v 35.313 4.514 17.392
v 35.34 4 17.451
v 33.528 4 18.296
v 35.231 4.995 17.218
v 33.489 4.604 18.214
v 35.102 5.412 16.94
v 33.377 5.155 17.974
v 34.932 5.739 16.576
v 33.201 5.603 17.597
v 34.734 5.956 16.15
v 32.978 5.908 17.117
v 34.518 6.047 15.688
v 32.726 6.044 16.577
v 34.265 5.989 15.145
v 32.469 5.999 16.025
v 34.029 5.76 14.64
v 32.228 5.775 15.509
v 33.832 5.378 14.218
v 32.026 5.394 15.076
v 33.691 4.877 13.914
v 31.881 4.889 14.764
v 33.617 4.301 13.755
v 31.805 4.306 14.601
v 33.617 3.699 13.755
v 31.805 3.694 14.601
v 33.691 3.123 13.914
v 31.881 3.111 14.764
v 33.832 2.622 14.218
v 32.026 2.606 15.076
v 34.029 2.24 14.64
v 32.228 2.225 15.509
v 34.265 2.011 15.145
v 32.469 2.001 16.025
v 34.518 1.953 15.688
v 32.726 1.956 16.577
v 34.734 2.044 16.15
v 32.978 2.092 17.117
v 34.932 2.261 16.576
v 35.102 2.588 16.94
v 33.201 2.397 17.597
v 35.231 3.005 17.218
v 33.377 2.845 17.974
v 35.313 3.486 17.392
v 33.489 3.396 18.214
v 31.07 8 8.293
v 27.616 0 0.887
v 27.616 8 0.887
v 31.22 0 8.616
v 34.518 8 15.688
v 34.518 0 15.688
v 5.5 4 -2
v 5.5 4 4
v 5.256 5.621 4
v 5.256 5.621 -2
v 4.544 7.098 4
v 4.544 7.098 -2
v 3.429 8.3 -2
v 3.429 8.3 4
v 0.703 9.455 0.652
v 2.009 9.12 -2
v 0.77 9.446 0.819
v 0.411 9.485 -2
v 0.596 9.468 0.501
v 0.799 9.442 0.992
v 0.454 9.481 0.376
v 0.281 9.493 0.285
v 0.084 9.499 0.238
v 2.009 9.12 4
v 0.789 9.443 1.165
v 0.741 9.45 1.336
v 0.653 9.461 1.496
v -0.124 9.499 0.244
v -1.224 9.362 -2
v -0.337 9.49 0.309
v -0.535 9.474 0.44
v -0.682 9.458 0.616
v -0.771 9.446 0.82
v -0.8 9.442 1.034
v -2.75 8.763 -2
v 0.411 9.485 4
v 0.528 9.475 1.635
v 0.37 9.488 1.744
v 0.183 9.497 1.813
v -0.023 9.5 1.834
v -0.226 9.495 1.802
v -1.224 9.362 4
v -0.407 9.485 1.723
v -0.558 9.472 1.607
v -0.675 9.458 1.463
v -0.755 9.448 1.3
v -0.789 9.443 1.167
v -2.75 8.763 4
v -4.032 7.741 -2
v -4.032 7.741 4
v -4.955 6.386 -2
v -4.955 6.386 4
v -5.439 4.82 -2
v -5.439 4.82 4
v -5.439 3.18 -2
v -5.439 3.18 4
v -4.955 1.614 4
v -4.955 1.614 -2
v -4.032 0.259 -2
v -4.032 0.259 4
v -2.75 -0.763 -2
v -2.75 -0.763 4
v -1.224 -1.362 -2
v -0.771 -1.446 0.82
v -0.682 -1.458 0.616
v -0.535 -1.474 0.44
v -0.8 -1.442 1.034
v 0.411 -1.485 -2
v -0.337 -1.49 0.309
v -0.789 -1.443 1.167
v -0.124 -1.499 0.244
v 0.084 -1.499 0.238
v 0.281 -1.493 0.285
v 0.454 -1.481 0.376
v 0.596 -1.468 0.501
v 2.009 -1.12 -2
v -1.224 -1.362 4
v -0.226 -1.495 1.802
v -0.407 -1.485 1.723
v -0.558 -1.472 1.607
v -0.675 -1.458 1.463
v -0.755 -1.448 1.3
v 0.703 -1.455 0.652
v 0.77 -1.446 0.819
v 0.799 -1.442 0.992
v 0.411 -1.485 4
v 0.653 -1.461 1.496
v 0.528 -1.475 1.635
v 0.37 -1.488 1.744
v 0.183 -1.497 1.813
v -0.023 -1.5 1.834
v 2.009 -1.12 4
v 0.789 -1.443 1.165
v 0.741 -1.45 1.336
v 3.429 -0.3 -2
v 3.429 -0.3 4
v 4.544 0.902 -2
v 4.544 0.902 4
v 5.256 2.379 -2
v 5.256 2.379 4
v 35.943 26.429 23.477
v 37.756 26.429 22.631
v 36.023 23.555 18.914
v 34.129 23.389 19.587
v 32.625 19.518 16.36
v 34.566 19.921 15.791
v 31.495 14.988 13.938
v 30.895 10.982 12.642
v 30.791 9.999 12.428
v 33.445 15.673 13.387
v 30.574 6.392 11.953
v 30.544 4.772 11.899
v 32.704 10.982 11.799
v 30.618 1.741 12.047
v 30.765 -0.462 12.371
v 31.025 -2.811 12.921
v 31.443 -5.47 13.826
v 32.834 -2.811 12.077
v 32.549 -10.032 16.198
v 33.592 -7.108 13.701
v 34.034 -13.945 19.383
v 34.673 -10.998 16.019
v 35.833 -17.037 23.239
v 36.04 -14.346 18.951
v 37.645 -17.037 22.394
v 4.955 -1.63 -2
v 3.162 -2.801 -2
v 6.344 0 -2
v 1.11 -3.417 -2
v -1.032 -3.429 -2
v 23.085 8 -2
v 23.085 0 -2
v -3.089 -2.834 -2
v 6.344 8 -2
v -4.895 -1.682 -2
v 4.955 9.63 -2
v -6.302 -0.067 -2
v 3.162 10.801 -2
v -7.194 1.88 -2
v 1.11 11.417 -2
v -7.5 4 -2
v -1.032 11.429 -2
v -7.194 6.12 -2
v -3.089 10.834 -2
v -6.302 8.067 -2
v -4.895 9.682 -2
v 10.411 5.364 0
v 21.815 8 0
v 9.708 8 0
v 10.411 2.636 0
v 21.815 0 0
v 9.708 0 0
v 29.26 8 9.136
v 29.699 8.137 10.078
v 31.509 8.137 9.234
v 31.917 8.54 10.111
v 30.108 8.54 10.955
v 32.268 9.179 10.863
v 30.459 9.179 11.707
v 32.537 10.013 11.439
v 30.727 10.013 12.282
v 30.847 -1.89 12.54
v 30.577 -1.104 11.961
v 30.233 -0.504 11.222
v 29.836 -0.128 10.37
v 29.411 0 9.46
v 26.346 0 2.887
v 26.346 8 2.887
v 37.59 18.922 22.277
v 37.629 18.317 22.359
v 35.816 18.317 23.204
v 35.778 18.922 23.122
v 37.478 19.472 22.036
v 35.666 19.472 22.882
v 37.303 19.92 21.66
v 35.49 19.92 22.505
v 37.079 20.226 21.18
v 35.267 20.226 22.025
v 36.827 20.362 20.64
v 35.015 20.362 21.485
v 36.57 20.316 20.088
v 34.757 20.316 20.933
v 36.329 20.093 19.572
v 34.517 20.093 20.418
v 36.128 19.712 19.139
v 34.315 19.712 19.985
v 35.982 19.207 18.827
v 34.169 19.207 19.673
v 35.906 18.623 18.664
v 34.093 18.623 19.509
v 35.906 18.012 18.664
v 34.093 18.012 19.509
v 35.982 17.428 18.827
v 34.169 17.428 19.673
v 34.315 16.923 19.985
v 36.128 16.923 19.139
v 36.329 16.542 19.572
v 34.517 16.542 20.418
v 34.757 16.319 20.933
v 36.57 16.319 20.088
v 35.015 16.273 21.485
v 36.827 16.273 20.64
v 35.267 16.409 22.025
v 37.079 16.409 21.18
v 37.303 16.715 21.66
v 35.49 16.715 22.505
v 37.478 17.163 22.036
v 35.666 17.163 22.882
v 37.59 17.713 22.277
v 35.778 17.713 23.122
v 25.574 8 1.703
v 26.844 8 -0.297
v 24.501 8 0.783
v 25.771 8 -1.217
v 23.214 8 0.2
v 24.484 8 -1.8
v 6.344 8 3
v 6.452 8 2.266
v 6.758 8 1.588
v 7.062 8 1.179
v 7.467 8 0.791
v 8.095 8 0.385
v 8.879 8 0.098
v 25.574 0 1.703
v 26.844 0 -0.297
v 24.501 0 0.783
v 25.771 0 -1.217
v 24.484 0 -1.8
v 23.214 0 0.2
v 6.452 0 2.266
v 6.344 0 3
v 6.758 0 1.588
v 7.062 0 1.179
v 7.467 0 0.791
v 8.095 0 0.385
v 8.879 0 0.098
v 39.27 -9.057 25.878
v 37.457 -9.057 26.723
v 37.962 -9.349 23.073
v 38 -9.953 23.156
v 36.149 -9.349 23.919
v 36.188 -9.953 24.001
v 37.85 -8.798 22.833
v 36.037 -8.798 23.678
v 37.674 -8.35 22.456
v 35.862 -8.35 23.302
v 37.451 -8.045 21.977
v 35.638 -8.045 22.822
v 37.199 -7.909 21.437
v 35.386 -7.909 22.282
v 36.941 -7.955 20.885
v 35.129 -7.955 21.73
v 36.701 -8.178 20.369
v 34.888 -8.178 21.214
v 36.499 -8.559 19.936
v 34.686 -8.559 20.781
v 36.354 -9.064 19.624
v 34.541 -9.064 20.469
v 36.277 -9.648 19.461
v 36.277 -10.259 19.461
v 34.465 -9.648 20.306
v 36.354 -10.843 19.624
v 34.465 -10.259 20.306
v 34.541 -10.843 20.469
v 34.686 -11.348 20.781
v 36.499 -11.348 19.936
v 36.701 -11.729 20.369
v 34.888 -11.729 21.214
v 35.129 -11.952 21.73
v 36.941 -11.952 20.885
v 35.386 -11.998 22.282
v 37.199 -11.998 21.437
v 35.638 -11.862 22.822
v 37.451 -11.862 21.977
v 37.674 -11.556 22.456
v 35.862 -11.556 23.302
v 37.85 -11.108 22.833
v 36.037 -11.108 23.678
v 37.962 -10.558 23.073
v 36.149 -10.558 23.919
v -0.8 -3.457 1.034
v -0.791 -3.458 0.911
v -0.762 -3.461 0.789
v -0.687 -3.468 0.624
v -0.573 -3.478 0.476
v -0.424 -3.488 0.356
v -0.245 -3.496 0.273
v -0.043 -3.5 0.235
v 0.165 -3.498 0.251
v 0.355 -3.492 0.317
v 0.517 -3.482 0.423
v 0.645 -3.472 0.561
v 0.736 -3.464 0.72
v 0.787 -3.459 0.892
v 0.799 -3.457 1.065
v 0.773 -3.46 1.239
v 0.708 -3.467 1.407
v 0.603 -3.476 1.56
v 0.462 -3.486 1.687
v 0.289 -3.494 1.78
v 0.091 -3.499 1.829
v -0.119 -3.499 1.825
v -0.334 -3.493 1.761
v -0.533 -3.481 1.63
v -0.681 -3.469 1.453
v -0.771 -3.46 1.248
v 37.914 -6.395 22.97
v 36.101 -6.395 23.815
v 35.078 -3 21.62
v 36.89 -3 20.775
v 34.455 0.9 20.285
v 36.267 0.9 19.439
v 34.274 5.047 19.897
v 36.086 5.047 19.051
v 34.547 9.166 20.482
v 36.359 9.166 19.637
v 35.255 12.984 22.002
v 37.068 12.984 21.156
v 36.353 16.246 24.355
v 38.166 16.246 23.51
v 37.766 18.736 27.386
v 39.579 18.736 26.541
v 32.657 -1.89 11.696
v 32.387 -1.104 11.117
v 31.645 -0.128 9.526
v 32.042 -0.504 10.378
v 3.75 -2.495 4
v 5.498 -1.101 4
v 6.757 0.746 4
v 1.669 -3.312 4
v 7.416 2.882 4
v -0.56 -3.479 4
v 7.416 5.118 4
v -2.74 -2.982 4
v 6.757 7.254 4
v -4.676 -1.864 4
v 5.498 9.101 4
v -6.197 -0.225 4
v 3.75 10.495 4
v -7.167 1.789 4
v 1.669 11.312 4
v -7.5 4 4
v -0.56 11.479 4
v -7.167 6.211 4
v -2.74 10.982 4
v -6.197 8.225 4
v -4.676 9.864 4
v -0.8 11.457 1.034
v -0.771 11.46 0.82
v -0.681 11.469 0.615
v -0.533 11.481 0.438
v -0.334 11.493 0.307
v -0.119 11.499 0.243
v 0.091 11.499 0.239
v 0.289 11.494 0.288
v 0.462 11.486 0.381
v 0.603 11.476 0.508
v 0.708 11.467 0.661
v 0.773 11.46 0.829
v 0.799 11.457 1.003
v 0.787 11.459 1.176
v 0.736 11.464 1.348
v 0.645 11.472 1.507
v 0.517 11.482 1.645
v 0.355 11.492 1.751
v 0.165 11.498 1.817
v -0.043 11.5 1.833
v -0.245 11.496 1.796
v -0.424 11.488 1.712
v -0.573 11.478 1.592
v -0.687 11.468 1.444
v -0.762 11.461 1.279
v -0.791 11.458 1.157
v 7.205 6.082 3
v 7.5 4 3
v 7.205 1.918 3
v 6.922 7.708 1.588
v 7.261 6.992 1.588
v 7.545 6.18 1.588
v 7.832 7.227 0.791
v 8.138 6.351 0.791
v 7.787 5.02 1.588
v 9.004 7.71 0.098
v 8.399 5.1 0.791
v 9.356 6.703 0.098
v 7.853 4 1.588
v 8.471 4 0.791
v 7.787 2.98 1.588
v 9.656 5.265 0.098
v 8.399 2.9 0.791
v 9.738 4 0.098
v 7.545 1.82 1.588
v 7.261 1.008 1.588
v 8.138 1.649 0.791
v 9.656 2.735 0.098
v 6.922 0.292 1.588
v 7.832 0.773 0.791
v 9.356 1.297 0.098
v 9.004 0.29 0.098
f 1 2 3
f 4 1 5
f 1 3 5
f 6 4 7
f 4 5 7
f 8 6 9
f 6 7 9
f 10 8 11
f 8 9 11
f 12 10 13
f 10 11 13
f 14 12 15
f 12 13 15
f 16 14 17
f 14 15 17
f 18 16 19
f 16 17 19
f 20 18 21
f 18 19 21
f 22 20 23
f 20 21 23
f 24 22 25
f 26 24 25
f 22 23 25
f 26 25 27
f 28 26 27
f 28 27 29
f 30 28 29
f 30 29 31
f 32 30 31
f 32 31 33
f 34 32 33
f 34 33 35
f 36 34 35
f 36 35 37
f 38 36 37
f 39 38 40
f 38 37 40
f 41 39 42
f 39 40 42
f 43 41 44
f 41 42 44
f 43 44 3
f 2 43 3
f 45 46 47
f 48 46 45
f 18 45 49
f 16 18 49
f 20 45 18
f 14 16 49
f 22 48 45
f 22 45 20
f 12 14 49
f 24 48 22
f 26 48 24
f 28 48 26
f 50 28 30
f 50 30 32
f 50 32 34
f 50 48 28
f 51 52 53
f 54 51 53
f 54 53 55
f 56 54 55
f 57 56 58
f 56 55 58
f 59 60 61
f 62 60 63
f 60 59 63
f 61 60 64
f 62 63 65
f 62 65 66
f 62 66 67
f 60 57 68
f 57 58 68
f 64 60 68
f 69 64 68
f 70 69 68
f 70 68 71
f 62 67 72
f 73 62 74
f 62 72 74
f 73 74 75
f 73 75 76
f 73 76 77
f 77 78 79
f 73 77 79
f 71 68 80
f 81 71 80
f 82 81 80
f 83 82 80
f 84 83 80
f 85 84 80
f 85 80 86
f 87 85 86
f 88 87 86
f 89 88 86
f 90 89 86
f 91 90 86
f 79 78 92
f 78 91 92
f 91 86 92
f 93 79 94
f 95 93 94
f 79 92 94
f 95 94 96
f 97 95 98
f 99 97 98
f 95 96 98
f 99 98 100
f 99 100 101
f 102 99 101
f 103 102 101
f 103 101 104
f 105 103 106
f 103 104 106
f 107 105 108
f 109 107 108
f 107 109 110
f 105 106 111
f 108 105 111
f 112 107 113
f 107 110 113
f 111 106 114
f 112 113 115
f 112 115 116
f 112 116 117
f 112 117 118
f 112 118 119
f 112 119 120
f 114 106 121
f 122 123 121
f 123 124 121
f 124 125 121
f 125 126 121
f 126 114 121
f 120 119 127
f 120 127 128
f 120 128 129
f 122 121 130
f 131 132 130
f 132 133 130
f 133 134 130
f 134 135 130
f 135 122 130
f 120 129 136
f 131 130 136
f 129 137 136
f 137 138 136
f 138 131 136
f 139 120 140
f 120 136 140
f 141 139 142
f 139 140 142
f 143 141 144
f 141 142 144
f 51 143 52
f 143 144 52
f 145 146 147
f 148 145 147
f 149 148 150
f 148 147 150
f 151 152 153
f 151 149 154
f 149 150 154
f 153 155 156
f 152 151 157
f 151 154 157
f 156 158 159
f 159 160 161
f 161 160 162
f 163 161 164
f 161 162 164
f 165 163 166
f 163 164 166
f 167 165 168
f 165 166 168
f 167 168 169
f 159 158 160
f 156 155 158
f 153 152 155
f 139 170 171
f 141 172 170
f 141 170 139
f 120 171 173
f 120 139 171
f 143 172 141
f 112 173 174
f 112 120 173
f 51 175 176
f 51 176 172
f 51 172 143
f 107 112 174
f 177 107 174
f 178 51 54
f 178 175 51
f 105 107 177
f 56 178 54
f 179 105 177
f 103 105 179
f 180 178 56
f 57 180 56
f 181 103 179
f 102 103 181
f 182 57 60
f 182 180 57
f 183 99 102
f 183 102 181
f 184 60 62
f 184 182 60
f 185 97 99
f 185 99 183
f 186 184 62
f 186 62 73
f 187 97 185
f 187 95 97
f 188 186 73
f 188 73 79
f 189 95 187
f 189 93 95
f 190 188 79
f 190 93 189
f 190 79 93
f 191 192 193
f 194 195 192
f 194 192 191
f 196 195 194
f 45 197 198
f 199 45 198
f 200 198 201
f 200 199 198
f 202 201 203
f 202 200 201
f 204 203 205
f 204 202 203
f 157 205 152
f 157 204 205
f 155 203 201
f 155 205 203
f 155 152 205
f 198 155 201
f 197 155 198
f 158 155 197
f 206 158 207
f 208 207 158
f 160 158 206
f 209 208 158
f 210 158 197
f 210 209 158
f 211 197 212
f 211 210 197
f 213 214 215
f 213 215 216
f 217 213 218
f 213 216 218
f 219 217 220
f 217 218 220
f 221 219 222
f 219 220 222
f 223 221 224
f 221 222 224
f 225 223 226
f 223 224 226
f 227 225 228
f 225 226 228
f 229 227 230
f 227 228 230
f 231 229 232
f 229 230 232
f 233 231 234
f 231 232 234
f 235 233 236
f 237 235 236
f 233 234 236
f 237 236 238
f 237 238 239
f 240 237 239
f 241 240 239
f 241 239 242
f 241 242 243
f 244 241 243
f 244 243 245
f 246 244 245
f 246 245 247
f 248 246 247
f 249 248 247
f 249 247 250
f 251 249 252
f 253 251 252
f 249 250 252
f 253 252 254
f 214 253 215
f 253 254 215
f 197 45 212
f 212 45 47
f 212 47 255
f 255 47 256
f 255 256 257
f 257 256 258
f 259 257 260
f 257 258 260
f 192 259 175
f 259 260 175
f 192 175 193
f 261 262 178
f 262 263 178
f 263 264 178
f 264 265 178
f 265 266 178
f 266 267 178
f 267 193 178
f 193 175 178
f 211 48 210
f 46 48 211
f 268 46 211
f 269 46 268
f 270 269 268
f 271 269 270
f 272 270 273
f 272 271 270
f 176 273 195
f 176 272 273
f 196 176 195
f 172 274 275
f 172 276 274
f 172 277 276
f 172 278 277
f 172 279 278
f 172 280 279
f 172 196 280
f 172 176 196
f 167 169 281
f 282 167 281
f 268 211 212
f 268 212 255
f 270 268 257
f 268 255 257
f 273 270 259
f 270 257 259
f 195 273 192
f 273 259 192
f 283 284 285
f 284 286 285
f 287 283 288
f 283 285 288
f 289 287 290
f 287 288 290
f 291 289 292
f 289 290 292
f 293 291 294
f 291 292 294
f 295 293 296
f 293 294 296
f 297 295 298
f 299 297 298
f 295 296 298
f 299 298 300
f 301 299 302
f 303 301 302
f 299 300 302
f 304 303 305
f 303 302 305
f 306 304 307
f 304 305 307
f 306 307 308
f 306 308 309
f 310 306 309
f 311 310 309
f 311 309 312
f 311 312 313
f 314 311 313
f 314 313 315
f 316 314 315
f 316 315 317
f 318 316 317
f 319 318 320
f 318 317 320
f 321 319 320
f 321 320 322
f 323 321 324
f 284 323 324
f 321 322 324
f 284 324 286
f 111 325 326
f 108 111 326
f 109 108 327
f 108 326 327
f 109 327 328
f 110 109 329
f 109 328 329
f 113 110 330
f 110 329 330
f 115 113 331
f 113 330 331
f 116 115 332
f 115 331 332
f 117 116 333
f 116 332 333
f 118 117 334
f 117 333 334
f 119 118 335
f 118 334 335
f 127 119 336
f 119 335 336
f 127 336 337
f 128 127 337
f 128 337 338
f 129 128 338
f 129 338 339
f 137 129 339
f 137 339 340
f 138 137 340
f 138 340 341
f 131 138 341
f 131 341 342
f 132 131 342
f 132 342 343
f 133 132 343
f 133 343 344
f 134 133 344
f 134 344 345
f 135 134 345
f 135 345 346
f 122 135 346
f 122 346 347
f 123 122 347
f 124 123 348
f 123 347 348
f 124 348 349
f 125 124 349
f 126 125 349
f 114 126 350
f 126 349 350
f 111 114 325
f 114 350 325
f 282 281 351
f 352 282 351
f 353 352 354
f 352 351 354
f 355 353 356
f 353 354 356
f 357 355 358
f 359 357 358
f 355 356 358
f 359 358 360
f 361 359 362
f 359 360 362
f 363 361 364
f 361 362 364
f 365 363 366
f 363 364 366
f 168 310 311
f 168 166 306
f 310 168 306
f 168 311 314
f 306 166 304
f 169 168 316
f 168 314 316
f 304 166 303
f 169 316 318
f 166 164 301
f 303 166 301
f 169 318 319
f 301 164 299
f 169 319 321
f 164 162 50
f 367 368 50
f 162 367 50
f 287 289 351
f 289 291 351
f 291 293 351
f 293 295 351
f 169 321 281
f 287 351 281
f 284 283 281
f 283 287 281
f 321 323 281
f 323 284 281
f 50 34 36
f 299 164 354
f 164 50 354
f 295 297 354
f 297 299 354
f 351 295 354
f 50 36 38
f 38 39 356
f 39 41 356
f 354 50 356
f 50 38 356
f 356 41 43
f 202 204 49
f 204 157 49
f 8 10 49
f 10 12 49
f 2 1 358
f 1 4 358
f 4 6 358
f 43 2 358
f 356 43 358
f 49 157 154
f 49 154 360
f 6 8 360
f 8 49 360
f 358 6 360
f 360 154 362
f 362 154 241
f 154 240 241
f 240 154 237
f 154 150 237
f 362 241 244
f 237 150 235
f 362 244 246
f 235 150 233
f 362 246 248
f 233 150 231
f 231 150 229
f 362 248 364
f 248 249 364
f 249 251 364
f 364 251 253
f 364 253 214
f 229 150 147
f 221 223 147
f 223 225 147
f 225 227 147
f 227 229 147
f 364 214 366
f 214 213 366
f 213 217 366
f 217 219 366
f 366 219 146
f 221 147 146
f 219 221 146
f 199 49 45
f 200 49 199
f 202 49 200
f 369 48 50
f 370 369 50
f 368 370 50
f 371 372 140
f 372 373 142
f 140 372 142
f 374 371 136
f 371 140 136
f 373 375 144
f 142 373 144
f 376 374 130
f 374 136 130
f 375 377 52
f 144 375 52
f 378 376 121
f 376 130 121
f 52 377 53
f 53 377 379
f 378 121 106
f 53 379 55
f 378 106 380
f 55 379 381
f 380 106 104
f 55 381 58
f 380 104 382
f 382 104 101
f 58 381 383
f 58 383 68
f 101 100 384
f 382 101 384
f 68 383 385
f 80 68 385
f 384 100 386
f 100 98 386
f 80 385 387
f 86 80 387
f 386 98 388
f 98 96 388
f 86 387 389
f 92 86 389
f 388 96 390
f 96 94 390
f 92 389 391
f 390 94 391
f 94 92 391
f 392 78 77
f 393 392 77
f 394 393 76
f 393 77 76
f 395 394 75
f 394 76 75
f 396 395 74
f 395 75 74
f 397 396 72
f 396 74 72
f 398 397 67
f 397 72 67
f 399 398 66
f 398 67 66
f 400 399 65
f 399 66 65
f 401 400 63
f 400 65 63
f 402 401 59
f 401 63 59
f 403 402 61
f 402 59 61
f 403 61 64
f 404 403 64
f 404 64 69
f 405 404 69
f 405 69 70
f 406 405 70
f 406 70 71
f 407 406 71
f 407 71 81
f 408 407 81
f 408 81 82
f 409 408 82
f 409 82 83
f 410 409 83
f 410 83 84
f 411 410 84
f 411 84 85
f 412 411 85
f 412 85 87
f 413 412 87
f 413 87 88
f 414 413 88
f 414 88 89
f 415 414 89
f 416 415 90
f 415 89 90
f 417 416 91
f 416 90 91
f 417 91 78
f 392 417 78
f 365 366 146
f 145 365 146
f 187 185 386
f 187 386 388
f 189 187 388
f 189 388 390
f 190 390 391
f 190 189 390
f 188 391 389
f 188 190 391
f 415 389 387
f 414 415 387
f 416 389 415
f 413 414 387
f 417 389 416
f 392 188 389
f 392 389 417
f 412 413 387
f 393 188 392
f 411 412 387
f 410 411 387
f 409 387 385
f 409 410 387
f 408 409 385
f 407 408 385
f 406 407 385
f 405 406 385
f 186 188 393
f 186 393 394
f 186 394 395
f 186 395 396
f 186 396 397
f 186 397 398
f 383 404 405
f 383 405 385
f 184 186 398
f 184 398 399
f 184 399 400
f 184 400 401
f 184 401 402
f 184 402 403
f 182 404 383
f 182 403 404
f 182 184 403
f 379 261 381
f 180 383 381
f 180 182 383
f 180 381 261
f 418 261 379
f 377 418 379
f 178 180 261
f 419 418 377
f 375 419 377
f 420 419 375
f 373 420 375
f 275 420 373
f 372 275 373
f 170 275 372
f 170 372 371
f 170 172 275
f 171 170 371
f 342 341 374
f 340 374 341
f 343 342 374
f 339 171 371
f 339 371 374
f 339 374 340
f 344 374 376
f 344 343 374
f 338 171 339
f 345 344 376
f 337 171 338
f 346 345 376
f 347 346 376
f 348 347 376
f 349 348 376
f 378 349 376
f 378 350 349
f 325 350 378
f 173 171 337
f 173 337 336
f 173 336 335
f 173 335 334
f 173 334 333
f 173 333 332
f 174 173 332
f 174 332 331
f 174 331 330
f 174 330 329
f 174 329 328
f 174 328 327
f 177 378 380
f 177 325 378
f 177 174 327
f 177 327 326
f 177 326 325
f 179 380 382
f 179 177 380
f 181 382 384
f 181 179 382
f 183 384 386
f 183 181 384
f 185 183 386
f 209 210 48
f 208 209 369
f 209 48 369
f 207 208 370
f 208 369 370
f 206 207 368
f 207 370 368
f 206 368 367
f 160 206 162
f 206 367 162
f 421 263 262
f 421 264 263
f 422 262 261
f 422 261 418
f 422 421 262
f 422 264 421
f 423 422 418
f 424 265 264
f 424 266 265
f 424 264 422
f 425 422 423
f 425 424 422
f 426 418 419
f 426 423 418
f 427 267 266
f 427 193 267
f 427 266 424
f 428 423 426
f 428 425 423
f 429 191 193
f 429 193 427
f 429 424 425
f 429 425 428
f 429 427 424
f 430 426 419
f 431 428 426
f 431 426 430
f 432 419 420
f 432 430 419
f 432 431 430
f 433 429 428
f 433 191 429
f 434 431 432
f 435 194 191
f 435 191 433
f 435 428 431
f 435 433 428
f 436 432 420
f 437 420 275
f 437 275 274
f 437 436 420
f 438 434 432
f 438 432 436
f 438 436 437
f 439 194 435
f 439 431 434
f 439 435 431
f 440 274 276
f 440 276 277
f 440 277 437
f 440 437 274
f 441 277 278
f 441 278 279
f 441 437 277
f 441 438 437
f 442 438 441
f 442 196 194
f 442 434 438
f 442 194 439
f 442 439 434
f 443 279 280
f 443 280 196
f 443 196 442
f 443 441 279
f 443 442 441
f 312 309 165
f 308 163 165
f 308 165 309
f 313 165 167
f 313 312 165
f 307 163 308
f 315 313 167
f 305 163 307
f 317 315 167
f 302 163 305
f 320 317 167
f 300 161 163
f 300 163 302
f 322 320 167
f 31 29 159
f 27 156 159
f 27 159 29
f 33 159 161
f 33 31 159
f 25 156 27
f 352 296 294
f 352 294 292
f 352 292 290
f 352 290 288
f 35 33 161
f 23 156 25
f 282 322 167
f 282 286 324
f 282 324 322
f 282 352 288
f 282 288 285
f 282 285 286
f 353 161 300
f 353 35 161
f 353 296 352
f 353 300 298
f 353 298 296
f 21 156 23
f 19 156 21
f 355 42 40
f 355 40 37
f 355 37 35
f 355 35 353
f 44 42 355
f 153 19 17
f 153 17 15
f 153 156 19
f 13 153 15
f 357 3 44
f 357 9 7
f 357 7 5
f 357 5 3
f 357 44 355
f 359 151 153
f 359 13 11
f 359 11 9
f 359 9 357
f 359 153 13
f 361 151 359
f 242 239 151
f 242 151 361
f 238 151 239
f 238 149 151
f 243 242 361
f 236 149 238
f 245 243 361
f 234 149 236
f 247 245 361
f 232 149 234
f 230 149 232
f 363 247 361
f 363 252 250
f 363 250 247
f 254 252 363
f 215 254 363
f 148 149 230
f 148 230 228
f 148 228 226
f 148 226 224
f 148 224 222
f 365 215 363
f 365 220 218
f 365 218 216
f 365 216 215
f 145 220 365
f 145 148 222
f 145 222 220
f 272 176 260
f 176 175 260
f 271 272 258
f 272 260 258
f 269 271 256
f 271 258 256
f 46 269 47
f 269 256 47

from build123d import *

# Parameters (mm, degrees)
BOSS_EXTRUDE1_DEPTH     = 8
FILLET1_R               = 5
BOSS_EXTRUDE2_DEPTH     = 2
SKETCH3_R               = 2.05
CUT_EXTRUDE3_DEPTH      = 10
CUT_EXTRUDE3_DEPTH_BACK = 10
FILLET2_R               = 4
SKETCH6_R               = 7.5
BOSS_EXTRUDE3_DEPTH     = 6
SKETCH2_R               = 5.5
CUT_EXTRUDE4_DEPTH      = 28.386006481
CUT_EXTRUDE4_DEPTH_BACK = 3
SKETCH8_R               = 0.8
CUT_EXTRUDE5_DEPTH      = 30.928860828
FILLET3_R               = 3


with BuildPart() as part:
    # Sketch1 → Boss-Extrude1 (new body)
    with BuildSketch(Plane(origin=(0, 0, 0), x_dir=(1, 0, 0), z_dir=(0, 1, 0))):
        Polygon((0, 0), (0, 2), (26.270067987, 2), (34.518104392, -15.687971152), (32.760161227, -16.641719455), (25, 0), align=None)
    extrude(amount=BOSS_EXTRUDE1_DEPTH)

    # Fillet1
    fillet1_edges = [part.edges().sort_by_distance(p)[0] for p in [
        (26.270067987, 4, -2),
        (25, 4, 0),
    ]]
    fillet(fillet1_edges, radius=FILLET1_R)

    # Sketch5 → Boss-Extrude2 (add)
    with BuildSketch(Plane(origin=(22.344115541, 0, -10.419232191), x_dir=(-0.422618262, 0, -0.906307787), z_dir=(0.906307787, 0, -0.422618262))):
        with BuildLine():
            Line((-40.780850255, 18.736062391), (-36.467218683, 26.428860828))
            ThreePointArc((-36.467218683, 26.428860828), (-23.692308478, 4.771999965), (-36.205658542, -17.037035395))
            Line((-36.205658542, -17.037035395), (-40.049339329, -9.057253488))
            ThreePointArc((-40.049339329, -9.057253488), (-32.517126315, 5.047276383), (-40.780850255, 18.736062391))
        make_face()
    extrude(amount=-BOSS_EXTRUDE2_DEPTH)

    # Sketch3 → Cut-Extrude3 (cut, two sides)
    with BuildSketch(Plane(origin=(20.534845121, 0, -9.575555539), x_dir=(0.422618262, 0, 0.906307787), z_dir=(-0.906307787, 0, 0.422618262))) as cut_extrude3_sk:
        with Locations((28.701516689, 4)):
            Circle(SKETCH3_R)
        with Locations((34.117040182, 18.317355913)):
            Circle(SKETCH3_R)
        with Locations((48.070293023, 24.611901983)):
            Circle(SKETCH3_R)
        with Locations((62.387648936, 19.19637849)):
            Circle(SKETCH3_R)
        with Locations((68.682195005, 5.243125649)):
            Circle(SKETCH3_R)
        with Locations((63.266671512, -9.074230264)):
            Circle(SKETCH3_R)
        with Locations((49.313418672, -15.368776333)):
            Circle(SKETCH3_R)
        with Locations((34.996062759, -9.953252841)):
            Circle(SKETCH3_R)
    extrude(amount=CUT_EXTRUDE3_DEPTH, mode=Mode.SUBTRACT)
    extrude(cut_extrude3_sk.sketch, amount=-CUT_EXTRUDE3_DEPTH_BACK, mode=Mode.SUBTRACT)

    # Fillet2
    fillet2_edges = [part.edges().sort_by_distance(p)[0] for p in [
        (31.634193328, 0, 11.865238709),
        (31.549009715, 8, 11.682561863),
    ]]
    fillet(fillet2_edges, radius=FILLET2_R)

    # Sketch6 → Boss-Extrude3 (add)
    with BuildSketch(Plane(origin=(0, 0, -2), x_dir=(-1, 0, 0), z_dir=(0, 0, -1))):
        with Locations((0, 4)):
            Circle(SKETCH6_R)
    extrude(amount=-BOSS_EXTRUDE3_DEPTH)

    # Sketch2 → Cut-Extrude4 (cut, two sides)
    with BuildSketch(Plane.XY) as cut_extrude4_sk:
        with Locations((0, 4)):
            Circle(SKETCH2_R)
    extrude(amount=CUT_EXTRUDE4_DEPTH, mode=Mode.SUBTRACT)
    extrude(cut_extrude4_sk.sketch, amount=-CUT_EXTRUDE4_DEPTH_BACK, mode=Mode.SUBTRACT)

    # Sketch8 → Cut-Extrude5 (cut, through all)
    with BuildSketch(Plane(origin=(0, -3.5, 0), x_dir=(-1, 0, 0), z_dir=(0, -1, 0))):
        with Locations((0, -1.034043254)):
            Circle(SKETCH8_R)
    extrude(amount=-CUT_EXTRUDE5_DEPTH, mode=Mode.SUBTRACT)

    # Fillet3
    fillet3_edges = [part.edges().sort_by_distance(p)[0] for p in [
        (7.5, 4, 0),
    ]]
    fillet(fillet3_edges, radius=FILLET3_R)


solid = part.part
